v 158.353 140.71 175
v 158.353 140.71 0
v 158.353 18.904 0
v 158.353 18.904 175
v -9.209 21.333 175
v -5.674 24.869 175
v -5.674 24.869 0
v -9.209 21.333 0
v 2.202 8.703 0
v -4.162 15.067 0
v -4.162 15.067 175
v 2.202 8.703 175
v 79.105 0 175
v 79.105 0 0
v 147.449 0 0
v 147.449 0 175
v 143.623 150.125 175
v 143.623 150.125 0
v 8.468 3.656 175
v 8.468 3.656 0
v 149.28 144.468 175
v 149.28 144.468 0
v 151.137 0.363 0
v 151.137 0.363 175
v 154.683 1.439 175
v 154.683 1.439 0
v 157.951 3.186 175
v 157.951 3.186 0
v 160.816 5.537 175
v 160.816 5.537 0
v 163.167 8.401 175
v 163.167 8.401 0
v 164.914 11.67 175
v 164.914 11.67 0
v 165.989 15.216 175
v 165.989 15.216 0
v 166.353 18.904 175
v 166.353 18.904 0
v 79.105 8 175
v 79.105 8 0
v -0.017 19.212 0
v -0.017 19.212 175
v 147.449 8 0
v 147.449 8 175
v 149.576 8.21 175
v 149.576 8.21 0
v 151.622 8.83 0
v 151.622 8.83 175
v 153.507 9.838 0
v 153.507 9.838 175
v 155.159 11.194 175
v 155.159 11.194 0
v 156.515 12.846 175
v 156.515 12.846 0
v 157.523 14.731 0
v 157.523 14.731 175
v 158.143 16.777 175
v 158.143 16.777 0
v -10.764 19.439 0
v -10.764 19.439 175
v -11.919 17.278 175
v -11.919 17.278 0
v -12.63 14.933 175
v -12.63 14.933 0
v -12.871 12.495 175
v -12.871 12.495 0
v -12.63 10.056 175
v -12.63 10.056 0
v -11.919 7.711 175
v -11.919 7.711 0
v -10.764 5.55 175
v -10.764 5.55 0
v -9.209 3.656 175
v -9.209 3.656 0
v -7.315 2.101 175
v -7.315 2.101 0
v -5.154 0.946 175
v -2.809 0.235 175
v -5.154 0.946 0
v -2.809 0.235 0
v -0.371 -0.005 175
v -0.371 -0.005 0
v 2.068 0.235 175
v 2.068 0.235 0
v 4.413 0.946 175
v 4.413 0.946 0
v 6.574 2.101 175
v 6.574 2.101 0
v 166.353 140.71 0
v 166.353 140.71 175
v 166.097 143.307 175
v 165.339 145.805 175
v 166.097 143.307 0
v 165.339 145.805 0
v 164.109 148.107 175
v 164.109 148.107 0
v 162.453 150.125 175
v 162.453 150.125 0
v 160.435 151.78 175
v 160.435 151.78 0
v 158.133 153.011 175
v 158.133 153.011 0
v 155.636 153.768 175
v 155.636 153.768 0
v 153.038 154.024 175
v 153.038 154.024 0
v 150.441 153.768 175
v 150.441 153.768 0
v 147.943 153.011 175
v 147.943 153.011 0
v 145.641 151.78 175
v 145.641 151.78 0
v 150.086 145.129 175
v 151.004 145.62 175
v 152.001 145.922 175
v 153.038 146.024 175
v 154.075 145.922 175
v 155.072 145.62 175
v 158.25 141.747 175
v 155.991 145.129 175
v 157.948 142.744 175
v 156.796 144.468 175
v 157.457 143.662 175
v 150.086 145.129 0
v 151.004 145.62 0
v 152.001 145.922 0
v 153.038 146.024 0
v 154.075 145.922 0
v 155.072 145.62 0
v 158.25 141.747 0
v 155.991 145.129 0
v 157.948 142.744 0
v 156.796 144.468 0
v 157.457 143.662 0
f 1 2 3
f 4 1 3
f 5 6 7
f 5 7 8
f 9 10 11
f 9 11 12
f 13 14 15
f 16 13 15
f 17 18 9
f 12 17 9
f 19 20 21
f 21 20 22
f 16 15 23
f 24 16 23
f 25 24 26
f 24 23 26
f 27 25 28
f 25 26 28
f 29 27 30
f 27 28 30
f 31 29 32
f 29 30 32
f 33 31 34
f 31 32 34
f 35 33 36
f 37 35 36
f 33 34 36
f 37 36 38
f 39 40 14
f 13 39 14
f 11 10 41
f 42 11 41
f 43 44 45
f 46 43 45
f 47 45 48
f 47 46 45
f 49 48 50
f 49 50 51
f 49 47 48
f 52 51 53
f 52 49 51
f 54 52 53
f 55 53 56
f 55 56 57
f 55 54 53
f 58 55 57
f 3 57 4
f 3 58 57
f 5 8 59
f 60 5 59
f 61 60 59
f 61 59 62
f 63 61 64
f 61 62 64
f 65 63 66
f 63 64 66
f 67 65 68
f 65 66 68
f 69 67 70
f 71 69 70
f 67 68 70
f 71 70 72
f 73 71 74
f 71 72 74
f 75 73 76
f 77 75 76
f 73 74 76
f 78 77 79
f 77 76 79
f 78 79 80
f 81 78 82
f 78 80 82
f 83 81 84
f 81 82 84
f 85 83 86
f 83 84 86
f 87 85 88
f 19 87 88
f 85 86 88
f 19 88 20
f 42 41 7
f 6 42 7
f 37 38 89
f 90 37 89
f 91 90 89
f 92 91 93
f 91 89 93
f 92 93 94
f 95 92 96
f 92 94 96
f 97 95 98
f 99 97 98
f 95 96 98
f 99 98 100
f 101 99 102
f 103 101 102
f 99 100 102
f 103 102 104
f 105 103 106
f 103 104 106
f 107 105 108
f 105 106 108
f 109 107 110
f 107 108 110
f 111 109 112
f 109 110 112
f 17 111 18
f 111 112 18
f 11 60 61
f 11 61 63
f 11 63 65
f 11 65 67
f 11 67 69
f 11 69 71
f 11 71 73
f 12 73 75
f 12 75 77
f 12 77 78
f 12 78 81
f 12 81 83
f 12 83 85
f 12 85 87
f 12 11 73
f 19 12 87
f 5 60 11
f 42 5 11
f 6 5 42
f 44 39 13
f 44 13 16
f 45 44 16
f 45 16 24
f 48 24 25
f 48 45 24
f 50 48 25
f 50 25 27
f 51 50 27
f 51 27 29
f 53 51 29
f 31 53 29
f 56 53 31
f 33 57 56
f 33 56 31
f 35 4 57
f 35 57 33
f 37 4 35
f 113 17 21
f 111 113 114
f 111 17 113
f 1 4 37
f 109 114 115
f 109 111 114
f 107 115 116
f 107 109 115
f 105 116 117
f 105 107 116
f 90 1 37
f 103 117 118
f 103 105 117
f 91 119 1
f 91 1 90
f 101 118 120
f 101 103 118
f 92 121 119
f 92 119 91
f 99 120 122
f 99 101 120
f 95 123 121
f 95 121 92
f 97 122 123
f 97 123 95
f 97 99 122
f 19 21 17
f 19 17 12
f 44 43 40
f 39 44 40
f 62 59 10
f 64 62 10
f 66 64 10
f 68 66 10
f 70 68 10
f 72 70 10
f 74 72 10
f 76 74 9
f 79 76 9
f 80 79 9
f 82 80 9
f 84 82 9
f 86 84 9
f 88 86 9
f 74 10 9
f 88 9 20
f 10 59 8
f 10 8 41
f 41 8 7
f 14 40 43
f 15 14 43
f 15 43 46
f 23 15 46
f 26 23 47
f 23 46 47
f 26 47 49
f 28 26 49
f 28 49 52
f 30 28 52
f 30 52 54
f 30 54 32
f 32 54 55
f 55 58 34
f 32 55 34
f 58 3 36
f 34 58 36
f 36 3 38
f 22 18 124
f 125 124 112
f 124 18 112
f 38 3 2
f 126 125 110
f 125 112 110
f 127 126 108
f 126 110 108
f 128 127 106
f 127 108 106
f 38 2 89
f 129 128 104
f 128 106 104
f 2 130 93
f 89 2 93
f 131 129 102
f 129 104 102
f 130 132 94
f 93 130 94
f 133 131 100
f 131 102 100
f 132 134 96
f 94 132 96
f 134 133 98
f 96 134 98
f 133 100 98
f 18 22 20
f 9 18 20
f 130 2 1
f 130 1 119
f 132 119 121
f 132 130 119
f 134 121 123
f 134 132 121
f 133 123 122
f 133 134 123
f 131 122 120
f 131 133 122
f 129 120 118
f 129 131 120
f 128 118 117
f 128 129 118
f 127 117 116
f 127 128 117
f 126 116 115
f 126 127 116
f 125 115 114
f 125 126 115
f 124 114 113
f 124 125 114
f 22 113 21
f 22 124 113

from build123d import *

# Parameters (mm, degrees)
PAD002_DEPTH = 175


with BuildPart() as part:
    # Sketch → Pad002 (new body)
    with BuildSketch(Plane.XY):
        with BuildLine():
            Line((8.468198, 3.655669), (149.280288, 144.467759))
            ThreePointArc((158.352585, 140.709891), (155.0719, 145.619782), (149.280288, 144.467759))
            Line((158.352585, 140.709891), (158.352585, 18.903732))
            ThreePointArc((147.448852, 8), (155.158955, 11.193629), (158.352585, 18.903732))
            Line((147.448852, 8), (79.105045, 8))
            Line((79.105045, 8), (79.105045, 0))
            Line((79.105045, 0), (147.448852, 0))
            ThreePointArc((147.448852, 0), (160.81581, 5.536775), (166.352585, 18.903732))
            Line((166.352585, 18.903732), (166.352585, 140.709891))
            ThreePointArc((166.352585, 140.709891), (158.133368, 153.010819), (143.623434, 150.124613))
            Line((143.623434, 150.124613), (2.202078, 8.703257))
            Line((-4.161883, 15.067218), (2.202078, 8.703257))
            Line((-4.161883, 15.067218), (-0.017083, 19.212018))
            Line((-0.017083, 19.212018), (-5.673937, 24.868873))
            Line((-5.673937, 24.868873), (-9.209471, 21.333339))
            ThreePointArc((-9.209471, 21.333339), (-9.209471, 3.655669), (8.468198, 3.655669))
        make_face()
    extrude(amount=PAD002_DEPTH)


solid = part.part
